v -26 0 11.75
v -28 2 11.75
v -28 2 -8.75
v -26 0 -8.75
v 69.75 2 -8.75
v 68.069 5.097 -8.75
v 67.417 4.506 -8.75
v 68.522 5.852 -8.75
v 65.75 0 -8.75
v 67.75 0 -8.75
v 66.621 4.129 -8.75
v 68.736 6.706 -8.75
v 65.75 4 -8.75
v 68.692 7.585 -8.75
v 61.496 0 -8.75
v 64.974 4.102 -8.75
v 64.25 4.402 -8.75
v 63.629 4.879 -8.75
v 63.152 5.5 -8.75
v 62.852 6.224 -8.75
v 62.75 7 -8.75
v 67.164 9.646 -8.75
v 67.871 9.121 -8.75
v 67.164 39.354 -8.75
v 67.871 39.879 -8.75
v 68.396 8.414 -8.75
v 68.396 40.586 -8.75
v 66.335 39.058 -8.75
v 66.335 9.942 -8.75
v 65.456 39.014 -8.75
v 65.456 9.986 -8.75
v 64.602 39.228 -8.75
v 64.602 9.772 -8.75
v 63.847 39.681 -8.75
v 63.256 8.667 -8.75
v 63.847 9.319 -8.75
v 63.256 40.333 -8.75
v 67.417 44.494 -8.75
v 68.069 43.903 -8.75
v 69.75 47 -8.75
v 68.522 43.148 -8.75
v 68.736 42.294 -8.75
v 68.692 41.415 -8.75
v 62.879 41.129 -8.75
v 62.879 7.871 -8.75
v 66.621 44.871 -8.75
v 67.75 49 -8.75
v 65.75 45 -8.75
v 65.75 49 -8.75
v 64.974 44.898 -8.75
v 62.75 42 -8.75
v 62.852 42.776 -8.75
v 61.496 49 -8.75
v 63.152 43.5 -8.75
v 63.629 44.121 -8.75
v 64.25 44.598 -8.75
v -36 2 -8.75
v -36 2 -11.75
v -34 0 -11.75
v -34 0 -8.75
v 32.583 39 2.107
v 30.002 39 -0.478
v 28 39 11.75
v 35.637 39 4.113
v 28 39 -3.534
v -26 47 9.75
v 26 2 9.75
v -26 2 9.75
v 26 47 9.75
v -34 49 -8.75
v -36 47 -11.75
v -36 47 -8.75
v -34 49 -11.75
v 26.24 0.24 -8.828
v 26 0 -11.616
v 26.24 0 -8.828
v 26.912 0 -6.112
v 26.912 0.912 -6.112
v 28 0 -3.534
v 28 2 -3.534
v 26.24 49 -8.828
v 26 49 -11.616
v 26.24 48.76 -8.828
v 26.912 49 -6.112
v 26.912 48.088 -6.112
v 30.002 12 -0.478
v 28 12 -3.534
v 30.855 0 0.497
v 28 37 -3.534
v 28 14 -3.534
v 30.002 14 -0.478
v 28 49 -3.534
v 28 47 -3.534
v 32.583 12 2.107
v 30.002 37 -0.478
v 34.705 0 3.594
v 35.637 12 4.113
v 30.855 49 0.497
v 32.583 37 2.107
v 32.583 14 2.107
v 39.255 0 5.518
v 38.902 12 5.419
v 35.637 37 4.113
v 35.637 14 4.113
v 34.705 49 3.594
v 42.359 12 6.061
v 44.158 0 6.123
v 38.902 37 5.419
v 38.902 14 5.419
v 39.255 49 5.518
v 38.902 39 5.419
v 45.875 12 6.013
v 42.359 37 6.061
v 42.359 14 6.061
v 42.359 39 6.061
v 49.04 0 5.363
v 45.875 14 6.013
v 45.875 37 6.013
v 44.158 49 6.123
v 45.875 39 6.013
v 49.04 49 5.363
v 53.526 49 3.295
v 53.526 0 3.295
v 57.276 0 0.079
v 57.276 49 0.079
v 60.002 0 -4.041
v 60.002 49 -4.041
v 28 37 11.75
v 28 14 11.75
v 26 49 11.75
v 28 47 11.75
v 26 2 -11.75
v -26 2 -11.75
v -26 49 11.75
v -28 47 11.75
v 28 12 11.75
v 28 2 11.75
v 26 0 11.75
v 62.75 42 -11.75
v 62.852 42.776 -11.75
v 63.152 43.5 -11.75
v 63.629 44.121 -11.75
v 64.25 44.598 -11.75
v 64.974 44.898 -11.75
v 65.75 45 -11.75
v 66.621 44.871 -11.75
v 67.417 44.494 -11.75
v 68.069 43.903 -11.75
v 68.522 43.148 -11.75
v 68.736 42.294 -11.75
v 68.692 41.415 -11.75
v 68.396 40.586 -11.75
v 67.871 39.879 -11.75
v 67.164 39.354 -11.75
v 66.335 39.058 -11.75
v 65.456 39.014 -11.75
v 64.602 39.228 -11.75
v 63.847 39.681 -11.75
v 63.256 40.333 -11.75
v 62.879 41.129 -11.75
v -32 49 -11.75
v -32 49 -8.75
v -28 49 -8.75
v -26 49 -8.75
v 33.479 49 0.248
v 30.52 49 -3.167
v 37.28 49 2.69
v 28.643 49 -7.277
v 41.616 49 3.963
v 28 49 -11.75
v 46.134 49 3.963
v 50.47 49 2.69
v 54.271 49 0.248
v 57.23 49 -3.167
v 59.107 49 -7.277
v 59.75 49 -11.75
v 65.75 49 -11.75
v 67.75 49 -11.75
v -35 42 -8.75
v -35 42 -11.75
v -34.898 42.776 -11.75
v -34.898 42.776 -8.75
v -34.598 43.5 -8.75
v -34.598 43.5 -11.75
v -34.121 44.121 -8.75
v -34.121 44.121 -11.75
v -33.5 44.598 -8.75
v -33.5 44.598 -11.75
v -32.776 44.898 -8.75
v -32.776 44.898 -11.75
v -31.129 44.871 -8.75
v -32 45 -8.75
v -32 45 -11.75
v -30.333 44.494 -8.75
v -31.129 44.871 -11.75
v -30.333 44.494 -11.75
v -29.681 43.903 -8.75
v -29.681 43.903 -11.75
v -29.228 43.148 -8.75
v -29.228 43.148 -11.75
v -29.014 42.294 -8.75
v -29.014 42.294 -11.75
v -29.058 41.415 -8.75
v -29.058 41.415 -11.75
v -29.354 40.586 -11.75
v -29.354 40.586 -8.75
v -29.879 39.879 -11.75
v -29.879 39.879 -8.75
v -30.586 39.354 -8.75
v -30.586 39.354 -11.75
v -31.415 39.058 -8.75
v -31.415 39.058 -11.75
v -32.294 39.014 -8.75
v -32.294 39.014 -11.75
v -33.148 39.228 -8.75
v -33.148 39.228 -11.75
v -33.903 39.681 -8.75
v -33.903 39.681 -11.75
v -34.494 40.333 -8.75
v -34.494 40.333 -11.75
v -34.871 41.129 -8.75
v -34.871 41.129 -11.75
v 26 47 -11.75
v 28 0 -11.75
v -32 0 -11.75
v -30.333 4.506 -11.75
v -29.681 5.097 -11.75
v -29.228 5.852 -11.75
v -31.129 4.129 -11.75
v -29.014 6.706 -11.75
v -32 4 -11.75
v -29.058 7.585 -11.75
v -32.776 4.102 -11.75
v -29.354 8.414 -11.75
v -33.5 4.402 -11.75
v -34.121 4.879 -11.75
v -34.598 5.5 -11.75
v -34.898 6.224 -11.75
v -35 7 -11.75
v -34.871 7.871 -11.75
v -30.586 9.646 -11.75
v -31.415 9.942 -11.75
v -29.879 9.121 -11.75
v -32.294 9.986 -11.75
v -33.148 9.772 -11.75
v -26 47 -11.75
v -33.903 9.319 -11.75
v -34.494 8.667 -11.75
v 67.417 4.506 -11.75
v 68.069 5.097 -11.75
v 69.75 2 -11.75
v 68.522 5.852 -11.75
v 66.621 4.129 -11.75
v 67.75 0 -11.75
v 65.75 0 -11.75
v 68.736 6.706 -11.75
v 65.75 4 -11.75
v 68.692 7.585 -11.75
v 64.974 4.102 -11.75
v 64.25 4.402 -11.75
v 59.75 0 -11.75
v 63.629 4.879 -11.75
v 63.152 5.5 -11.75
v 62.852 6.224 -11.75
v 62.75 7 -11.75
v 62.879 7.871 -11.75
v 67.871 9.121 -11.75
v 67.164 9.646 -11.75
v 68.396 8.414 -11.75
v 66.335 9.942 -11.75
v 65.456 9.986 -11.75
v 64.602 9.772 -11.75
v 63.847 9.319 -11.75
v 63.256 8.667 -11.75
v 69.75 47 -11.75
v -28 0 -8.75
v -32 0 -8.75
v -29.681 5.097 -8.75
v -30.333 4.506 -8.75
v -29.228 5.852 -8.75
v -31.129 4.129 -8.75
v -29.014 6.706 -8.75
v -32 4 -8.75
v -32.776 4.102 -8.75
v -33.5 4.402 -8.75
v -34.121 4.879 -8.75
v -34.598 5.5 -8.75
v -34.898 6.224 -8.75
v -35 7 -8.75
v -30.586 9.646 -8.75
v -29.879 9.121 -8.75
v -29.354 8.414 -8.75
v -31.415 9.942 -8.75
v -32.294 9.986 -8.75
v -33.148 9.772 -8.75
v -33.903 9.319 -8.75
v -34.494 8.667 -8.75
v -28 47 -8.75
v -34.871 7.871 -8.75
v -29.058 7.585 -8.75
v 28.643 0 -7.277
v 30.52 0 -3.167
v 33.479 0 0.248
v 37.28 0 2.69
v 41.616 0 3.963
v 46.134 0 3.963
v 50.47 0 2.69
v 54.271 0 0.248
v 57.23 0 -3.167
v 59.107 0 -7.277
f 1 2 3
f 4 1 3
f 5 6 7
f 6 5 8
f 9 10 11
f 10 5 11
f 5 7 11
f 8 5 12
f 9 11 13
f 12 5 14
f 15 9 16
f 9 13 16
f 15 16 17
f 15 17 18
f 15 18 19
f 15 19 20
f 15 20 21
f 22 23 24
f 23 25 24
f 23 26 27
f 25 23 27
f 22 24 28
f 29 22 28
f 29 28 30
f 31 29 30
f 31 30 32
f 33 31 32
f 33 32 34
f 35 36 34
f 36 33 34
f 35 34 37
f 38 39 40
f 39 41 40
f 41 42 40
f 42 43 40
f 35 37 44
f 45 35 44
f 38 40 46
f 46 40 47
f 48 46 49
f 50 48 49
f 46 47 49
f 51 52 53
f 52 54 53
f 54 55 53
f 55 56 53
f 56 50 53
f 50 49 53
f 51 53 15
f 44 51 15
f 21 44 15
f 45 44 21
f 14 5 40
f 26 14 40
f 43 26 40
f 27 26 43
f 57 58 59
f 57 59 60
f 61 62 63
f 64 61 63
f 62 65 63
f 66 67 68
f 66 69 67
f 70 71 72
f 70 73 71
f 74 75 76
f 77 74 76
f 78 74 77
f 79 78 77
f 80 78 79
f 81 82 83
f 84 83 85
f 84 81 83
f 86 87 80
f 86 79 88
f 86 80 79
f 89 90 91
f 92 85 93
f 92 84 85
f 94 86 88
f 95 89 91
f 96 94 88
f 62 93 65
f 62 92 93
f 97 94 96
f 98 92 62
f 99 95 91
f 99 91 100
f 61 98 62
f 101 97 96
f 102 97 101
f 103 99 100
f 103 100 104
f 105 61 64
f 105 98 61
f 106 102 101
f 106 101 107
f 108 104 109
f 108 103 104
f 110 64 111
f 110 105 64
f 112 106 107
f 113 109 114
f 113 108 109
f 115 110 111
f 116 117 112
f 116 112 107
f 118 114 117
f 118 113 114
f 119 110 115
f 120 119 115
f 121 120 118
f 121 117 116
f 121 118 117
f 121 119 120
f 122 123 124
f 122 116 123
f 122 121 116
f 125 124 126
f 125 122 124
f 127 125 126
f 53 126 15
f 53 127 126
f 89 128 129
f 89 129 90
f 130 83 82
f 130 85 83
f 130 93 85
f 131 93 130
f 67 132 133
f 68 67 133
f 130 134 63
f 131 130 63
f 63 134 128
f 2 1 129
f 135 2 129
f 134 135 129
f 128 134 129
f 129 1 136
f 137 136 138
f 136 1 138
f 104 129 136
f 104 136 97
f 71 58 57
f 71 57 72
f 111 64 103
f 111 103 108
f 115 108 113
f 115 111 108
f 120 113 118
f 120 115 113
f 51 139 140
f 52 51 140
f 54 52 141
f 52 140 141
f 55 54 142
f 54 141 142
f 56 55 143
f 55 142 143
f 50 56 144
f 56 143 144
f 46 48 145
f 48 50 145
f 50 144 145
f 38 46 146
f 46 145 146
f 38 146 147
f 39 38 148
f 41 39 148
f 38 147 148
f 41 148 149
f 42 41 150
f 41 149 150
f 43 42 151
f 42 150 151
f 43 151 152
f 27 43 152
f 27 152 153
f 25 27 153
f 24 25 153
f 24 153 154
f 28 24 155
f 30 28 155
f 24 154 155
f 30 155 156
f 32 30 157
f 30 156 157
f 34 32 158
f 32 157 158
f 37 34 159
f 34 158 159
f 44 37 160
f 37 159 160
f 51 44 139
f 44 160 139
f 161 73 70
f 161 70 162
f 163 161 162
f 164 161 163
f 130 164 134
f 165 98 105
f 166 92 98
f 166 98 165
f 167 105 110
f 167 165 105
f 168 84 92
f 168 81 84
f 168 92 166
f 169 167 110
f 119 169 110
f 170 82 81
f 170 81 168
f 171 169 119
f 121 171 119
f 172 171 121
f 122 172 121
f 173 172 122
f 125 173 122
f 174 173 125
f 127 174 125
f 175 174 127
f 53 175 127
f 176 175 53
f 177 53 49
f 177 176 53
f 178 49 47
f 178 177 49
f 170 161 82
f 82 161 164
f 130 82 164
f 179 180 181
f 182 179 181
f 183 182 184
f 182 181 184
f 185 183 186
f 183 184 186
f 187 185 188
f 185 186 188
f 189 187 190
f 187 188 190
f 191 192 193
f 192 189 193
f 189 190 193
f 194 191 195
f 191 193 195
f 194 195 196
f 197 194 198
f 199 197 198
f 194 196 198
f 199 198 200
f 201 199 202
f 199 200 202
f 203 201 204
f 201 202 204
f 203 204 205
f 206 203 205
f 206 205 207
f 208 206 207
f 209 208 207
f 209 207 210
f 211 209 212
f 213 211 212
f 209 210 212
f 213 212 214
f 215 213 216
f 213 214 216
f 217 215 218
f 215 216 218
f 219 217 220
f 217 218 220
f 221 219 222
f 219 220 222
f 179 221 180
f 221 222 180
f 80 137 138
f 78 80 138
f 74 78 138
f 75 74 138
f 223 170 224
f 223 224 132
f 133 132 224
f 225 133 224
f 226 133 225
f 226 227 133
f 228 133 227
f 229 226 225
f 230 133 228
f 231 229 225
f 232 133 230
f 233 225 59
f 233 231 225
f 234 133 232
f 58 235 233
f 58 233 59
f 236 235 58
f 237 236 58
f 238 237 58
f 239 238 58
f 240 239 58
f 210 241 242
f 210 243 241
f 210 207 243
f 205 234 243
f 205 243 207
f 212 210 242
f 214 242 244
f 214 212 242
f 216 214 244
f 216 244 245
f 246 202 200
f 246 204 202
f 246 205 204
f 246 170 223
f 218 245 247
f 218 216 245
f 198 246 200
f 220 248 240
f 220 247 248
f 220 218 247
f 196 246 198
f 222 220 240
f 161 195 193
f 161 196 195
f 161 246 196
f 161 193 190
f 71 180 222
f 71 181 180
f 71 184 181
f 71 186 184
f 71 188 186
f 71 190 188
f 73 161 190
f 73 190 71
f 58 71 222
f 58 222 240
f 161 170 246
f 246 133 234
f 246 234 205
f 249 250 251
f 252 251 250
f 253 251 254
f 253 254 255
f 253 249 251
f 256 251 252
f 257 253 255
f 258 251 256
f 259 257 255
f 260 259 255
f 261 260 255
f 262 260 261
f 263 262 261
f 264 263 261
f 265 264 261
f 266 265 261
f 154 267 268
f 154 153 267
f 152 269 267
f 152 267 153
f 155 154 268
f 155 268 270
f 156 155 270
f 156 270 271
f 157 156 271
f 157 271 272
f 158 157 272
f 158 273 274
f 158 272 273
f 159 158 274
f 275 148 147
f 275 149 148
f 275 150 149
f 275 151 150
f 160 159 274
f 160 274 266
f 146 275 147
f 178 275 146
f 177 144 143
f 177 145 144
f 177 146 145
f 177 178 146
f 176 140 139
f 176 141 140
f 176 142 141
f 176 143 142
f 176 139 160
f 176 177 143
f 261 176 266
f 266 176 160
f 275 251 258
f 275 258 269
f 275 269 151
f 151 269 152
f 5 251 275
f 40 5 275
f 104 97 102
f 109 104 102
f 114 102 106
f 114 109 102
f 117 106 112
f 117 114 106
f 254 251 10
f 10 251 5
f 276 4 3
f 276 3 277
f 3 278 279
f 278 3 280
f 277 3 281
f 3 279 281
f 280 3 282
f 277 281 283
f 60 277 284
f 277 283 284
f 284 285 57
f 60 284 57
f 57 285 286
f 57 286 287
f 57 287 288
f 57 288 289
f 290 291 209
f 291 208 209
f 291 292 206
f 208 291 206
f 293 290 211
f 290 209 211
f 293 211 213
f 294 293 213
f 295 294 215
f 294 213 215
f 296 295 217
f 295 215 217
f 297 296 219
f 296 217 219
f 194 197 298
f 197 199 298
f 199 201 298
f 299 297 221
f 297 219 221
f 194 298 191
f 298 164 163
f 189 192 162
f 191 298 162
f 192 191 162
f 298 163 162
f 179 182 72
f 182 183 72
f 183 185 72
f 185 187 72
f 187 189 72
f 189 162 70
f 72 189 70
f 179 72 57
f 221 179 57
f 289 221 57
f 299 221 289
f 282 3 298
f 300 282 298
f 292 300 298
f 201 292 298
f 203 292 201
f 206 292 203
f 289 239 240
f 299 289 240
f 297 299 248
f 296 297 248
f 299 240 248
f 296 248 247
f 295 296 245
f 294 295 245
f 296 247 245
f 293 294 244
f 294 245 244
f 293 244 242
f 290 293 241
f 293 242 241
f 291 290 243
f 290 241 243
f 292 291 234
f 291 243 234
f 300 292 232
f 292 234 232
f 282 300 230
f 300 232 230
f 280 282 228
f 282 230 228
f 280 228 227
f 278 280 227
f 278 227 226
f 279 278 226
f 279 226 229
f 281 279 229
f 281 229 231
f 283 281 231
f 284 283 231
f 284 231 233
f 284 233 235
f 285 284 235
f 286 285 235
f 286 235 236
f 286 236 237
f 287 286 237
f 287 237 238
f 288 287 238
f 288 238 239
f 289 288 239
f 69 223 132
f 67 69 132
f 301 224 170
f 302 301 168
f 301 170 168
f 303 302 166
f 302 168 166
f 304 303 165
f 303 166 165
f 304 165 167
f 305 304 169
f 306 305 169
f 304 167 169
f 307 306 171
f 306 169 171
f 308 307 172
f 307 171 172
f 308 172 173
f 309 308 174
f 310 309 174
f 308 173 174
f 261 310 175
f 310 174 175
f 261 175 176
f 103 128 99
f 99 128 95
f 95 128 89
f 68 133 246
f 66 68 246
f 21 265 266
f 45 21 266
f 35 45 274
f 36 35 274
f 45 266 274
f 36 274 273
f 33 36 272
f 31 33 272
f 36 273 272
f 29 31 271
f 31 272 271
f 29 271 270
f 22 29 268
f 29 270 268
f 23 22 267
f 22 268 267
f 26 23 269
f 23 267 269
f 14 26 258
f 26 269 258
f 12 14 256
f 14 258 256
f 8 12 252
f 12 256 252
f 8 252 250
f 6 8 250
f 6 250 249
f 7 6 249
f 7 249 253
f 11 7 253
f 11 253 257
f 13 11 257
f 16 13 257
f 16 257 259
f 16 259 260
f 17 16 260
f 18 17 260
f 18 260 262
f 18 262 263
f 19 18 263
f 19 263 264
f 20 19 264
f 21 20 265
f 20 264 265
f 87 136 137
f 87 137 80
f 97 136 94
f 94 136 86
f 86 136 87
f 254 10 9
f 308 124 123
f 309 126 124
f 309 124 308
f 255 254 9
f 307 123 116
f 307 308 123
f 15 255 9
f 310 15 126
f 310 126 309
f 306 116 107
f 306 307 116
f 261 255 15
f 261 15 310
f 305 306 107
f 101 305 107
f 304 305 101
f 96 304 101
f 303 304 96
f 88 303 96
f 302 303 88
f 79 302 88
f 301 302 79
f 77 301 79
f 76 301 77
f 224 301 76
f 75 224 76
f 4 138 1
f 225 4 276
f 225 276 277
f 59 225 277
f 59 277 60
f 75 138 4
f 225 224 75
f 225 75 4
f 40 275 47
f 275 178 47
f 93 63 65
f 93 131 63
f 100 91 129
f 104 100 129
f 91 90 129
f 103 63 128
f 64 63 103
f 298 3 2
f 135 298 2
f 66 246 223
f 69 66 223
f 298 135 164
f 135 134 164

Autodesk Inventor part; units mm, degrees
ref_plane "YZ Plane" through (0, 0, 0) normal (1, 0, 0) x (0, 1, 0)
ref_plane "XZ Plane" through (0, 0, 0) normal (0, 1, 0) x (-1, 0, 0)
ref_plane "XY Plane" through (0, 0, 0) normal (0, 0, 1) x (1, 0, 0)
sketch "Esboço1" plane through (0, 0, 0) normal (0, 1, 0) x (-1, 0, 0)
  line L0 (-28, -11.75) -> (28, -11.75)
  line L1 (28, -11.75) -> (28, 11.75)
  line L2 (28, 11.75) -> (-28, 11.75)
  line L3 (-28, 11.75) -> (-28, -11.75)
  line L4 (-28, -11.75) -> (28, 11.75) construction
  line L5 (28, -11.75) -> (-28, 11.75) construction
  point P0 (0, 0)
  dimension "d0" = 56
  dimension "d1" = 23.5
extrude "Extrusão1" add sketch "Esboço1" along normal blind 49
sketch "Esboço2" plane through (28, 0, -11.75) normal (0, 0, -1) x (-1, 0, 0)
  line L0 (0, 49) -> (56, 49) projected
  line L1 (0, 49) -> (-33.75, 49)
  line L2 (-33.75, 49) -> (-33.75, 0)
  line L3 (0, 0) -> (56, 0) projected
  line L4 (-33.75, 0) -> (0, 0)
  line L5 (0, 0) -> (0, 49)
  point P0 (28, 0)
  dimension "d4" = 33.75
extrude "Extrusão2" add sketch "Esboço2" against normal blind 17.875
sketch "Esboço3" plane through (0, 49, 0) normal (0, 1, 0) x (1, 0, 0)
  line L0 (-28, 11.75) -> (61.75, 11.75) projected
  line L1 (61.75, 11.75) -> (59.75, 11.75)
  line L2 (59.75, 11.75) -> (43.875, 11.75)
  circle A0 centre (43.875, 11.75) radius 15.875
  point P0 (0, 0)
  dimension "d7" = 2
  dimension "d8" = 15.875
extrude "Extrusão3" cut sketch "Esboço3" against normal blind 49
sketch "Esboço4" plane through (61.75, 0, -11.75) normal (0, 0, -1) x (-1, 0, 0)
  line L0 (0, 49) -> (33.75, 49) projected
  line L1 (33.75, 0) -> (0, 0) projected
  line L2 (0, 49) -> (0, 0)
  line L3 (0, 0) -> (-8, 0)
  line L4 (-8, 0) -> (-8, 49)
  line L5 (-8, 49) -> (0, 49)
  line L6 (-4, 0) -> (-4, 7)
  line L7 (-4, 49) -> (-4, 42)
  circle A0 centre (-4, 42) radius 3
  circle A1 centre (-4, 7) radius 3
  point P0 (61.75, 0)
  dimension "d11" = 8
  dimension "d12" = 7
  dimension "d13" = 7
  dimension "d14" = 6
  dimension "d15" = 6
extrude "Extrusão4" add sketch "Esboço4" against normal blind 3
sketch "Esboço5" plane through (0, 49, 0) normal (0, 1, 0) x (1, 0, 0)
  arc A0 (28, 11.75) -> (59.75, 11.75) centre (43.875, 11.75) ccw projected
  circle A1 centre (43.875, 11.75) radius 17.875
  line L0 (61.75, -6.125) -> (28, -6.125) projected
  line L1 (69.75, 8.75) -> (61.75, 8.75) projected
  line L2 (61.75, 8.75) -> (61.4965, 8.75)
  line L3 (61.75, 8.75) -> (61.75, -6.125)
  line L4 (43.875, -6.125) -> (61.75, -6.125)
  line L5 (28, -11.75) -> (28, -6.125) projected
  line L6 (43.875, -6.125) -> (28, -6.125)
  line L7 (28, -6.125) -> (28, 3.5342)
  point P0 (0, 0)
extrude "Extrusão5" cut sketch "Esboço5" against normal blind 49 contours A1 L0 L7 | L2 L3 L0 A1
sketch "Esboço6" plane through (-28, 0, -11.75) normal (0, 0, -1) x (-1, 0, 0)
  line L0 (0, 0) -> (0, 49) projected
  line L1 (0, 49) -> (0, 0)
  line L2 (0, 0) -> (8, 0)
  line L3 (8, 0) -> (8, 49)
  line L4 (8, 49) -> (0, 49)
  line L5 (4, 49) -> (4, 42)
  line L6 (4, 0) -> (4, 7)
  circle A0 centre (4, 7) radius 3
  circle A1 centre (4, 42) radius 3
  point P0 (-28, 0)
  dimension "d20" = 8
  dimension "d21" = 7
  dimension "d22" = 7
  dimension "d23" = 6
  dimension "d24" = 6
extrude "Extrusão6" add sketch "Esboço6" against normal blind 3
sketch "Esboço8" plane through (28, 0, -11.75) normal (0, 0, -1) x (-1, 0, 0)
  line L0 (0, 49) -> (0, 0) projected
  line L1 (0, 49) -> (0, 47)
  line L2 (0, 47) -> (2, 47)
  line L3 (2, 47) -> (2, 2)
  line L4 (2, 47) -> (47, 47) construction
  line L5 (2, 2) -> (54, 2)
  line L6 (2, 2) -> (54, 2) construction
  line L7 (54, 2) -> (54, 47)
  line L8 (54, 47) -> (2, 47)
  point P0 (28, 0)
  dimension "d27" = 2
  dimension "d28" = 2
  dimension "d29" = 45
  dimension "d30" = 90
  dimension "d31" = 52
  dimension "d32" = 0
extrude "Extrusão7" cut sketch "Esboço8" against normal blind 21.5
sketch "Esboço10" plane through (28, 0, 11.75) normal (1, 0, 0) x (0, 0, -1)
  line L0 (0, 0) -> (0, 49) projected
  line L1 (0, 49) -> (0, 37)
  line L2 (0, 0) -> (0, 12)
  line L3 (0, 12) -> (16, 12)
  line L4 (16, 12) -> (16, 14)
  line L5 (16, 14) -> (0, 14)
  line L6 (0, 12) -> (0, 14)
  line L7 (0, 37) -> (16, 37)
  line L8 (16, 37) -> (16, 39)
  line L9 (16, 39) -> (0, 39)
  point P0 (11.75, 0)
  dimension "d38" = 12
  dimension "d41" = 12
  dimension "d42" = 16
  dimension "d43" = 2
  dimension "d44" = 16
  dimension "d45" = 2
extrude "Extrusão9" add sketch "Esboço10" along normal blind 17.875
sketch "Esboço11" plane through (28, 39, 11.75) normal (0, 1, 0) x (1, 0, 0)
  arc A0 (0, 15.2842) -> (33.4965, 20.5) centre (15.875, 23.5) ccw projected
  arc A1 (0, 23.5) -> (31.75, 23.5) centre (15.875, 23.5) ccw projected
  line L0 (17.875, 0) -> (17.875, 5.7372) projected
  line L1 (17.875, 5.7372) -> (17.875, 0)
  line L2 (0, 0) -> (17.875, 0) projected
  line L3 (17.875, 0) -> (0, 0)
  line L4 (0, 0) -> (7.6367, 7.6367)
  arc A2 (0, 15.2842) -> (17.875, 5.7372) centre (15.875, 23.5) ccw projected
  arc A3 (7.6367, 7.6367) -> (17.875, 5.7372) centre (15.875, 23.5) ccw
  line L5 (1.8834, 16) -> (17.875, 16) projected
  line L6 (1.8834, 16) -> (17.875, 16)
  line L7 (17.875, 16) -> (17.875, 7.7515) projected
  line L8 (17.875, 16) -> (17.875, 7.7515)
  arc A4 (1.8834, 16) -> (17.875, 7.7515) centre (15.875, 23.5) ccw
  point P0 (-28, 11.75)
  dimension "d48" = 45
extrude "Extrusão10" cut sketch "Esboço11" against normal blind 27.875
chamfer "Chanfro1" distance 2 angle 45 8 edges at (28, 49, 4.1079) (28, 0, 4.1079) (-28, 0, 1.5) (-28, 49, 1.5) (69.75, 49, -10.25) (69.75, 0, -10.25) (-36, 49, -10.25) (-36, 0, -10.25)
properties part number "KS  Dianteiro Front"
